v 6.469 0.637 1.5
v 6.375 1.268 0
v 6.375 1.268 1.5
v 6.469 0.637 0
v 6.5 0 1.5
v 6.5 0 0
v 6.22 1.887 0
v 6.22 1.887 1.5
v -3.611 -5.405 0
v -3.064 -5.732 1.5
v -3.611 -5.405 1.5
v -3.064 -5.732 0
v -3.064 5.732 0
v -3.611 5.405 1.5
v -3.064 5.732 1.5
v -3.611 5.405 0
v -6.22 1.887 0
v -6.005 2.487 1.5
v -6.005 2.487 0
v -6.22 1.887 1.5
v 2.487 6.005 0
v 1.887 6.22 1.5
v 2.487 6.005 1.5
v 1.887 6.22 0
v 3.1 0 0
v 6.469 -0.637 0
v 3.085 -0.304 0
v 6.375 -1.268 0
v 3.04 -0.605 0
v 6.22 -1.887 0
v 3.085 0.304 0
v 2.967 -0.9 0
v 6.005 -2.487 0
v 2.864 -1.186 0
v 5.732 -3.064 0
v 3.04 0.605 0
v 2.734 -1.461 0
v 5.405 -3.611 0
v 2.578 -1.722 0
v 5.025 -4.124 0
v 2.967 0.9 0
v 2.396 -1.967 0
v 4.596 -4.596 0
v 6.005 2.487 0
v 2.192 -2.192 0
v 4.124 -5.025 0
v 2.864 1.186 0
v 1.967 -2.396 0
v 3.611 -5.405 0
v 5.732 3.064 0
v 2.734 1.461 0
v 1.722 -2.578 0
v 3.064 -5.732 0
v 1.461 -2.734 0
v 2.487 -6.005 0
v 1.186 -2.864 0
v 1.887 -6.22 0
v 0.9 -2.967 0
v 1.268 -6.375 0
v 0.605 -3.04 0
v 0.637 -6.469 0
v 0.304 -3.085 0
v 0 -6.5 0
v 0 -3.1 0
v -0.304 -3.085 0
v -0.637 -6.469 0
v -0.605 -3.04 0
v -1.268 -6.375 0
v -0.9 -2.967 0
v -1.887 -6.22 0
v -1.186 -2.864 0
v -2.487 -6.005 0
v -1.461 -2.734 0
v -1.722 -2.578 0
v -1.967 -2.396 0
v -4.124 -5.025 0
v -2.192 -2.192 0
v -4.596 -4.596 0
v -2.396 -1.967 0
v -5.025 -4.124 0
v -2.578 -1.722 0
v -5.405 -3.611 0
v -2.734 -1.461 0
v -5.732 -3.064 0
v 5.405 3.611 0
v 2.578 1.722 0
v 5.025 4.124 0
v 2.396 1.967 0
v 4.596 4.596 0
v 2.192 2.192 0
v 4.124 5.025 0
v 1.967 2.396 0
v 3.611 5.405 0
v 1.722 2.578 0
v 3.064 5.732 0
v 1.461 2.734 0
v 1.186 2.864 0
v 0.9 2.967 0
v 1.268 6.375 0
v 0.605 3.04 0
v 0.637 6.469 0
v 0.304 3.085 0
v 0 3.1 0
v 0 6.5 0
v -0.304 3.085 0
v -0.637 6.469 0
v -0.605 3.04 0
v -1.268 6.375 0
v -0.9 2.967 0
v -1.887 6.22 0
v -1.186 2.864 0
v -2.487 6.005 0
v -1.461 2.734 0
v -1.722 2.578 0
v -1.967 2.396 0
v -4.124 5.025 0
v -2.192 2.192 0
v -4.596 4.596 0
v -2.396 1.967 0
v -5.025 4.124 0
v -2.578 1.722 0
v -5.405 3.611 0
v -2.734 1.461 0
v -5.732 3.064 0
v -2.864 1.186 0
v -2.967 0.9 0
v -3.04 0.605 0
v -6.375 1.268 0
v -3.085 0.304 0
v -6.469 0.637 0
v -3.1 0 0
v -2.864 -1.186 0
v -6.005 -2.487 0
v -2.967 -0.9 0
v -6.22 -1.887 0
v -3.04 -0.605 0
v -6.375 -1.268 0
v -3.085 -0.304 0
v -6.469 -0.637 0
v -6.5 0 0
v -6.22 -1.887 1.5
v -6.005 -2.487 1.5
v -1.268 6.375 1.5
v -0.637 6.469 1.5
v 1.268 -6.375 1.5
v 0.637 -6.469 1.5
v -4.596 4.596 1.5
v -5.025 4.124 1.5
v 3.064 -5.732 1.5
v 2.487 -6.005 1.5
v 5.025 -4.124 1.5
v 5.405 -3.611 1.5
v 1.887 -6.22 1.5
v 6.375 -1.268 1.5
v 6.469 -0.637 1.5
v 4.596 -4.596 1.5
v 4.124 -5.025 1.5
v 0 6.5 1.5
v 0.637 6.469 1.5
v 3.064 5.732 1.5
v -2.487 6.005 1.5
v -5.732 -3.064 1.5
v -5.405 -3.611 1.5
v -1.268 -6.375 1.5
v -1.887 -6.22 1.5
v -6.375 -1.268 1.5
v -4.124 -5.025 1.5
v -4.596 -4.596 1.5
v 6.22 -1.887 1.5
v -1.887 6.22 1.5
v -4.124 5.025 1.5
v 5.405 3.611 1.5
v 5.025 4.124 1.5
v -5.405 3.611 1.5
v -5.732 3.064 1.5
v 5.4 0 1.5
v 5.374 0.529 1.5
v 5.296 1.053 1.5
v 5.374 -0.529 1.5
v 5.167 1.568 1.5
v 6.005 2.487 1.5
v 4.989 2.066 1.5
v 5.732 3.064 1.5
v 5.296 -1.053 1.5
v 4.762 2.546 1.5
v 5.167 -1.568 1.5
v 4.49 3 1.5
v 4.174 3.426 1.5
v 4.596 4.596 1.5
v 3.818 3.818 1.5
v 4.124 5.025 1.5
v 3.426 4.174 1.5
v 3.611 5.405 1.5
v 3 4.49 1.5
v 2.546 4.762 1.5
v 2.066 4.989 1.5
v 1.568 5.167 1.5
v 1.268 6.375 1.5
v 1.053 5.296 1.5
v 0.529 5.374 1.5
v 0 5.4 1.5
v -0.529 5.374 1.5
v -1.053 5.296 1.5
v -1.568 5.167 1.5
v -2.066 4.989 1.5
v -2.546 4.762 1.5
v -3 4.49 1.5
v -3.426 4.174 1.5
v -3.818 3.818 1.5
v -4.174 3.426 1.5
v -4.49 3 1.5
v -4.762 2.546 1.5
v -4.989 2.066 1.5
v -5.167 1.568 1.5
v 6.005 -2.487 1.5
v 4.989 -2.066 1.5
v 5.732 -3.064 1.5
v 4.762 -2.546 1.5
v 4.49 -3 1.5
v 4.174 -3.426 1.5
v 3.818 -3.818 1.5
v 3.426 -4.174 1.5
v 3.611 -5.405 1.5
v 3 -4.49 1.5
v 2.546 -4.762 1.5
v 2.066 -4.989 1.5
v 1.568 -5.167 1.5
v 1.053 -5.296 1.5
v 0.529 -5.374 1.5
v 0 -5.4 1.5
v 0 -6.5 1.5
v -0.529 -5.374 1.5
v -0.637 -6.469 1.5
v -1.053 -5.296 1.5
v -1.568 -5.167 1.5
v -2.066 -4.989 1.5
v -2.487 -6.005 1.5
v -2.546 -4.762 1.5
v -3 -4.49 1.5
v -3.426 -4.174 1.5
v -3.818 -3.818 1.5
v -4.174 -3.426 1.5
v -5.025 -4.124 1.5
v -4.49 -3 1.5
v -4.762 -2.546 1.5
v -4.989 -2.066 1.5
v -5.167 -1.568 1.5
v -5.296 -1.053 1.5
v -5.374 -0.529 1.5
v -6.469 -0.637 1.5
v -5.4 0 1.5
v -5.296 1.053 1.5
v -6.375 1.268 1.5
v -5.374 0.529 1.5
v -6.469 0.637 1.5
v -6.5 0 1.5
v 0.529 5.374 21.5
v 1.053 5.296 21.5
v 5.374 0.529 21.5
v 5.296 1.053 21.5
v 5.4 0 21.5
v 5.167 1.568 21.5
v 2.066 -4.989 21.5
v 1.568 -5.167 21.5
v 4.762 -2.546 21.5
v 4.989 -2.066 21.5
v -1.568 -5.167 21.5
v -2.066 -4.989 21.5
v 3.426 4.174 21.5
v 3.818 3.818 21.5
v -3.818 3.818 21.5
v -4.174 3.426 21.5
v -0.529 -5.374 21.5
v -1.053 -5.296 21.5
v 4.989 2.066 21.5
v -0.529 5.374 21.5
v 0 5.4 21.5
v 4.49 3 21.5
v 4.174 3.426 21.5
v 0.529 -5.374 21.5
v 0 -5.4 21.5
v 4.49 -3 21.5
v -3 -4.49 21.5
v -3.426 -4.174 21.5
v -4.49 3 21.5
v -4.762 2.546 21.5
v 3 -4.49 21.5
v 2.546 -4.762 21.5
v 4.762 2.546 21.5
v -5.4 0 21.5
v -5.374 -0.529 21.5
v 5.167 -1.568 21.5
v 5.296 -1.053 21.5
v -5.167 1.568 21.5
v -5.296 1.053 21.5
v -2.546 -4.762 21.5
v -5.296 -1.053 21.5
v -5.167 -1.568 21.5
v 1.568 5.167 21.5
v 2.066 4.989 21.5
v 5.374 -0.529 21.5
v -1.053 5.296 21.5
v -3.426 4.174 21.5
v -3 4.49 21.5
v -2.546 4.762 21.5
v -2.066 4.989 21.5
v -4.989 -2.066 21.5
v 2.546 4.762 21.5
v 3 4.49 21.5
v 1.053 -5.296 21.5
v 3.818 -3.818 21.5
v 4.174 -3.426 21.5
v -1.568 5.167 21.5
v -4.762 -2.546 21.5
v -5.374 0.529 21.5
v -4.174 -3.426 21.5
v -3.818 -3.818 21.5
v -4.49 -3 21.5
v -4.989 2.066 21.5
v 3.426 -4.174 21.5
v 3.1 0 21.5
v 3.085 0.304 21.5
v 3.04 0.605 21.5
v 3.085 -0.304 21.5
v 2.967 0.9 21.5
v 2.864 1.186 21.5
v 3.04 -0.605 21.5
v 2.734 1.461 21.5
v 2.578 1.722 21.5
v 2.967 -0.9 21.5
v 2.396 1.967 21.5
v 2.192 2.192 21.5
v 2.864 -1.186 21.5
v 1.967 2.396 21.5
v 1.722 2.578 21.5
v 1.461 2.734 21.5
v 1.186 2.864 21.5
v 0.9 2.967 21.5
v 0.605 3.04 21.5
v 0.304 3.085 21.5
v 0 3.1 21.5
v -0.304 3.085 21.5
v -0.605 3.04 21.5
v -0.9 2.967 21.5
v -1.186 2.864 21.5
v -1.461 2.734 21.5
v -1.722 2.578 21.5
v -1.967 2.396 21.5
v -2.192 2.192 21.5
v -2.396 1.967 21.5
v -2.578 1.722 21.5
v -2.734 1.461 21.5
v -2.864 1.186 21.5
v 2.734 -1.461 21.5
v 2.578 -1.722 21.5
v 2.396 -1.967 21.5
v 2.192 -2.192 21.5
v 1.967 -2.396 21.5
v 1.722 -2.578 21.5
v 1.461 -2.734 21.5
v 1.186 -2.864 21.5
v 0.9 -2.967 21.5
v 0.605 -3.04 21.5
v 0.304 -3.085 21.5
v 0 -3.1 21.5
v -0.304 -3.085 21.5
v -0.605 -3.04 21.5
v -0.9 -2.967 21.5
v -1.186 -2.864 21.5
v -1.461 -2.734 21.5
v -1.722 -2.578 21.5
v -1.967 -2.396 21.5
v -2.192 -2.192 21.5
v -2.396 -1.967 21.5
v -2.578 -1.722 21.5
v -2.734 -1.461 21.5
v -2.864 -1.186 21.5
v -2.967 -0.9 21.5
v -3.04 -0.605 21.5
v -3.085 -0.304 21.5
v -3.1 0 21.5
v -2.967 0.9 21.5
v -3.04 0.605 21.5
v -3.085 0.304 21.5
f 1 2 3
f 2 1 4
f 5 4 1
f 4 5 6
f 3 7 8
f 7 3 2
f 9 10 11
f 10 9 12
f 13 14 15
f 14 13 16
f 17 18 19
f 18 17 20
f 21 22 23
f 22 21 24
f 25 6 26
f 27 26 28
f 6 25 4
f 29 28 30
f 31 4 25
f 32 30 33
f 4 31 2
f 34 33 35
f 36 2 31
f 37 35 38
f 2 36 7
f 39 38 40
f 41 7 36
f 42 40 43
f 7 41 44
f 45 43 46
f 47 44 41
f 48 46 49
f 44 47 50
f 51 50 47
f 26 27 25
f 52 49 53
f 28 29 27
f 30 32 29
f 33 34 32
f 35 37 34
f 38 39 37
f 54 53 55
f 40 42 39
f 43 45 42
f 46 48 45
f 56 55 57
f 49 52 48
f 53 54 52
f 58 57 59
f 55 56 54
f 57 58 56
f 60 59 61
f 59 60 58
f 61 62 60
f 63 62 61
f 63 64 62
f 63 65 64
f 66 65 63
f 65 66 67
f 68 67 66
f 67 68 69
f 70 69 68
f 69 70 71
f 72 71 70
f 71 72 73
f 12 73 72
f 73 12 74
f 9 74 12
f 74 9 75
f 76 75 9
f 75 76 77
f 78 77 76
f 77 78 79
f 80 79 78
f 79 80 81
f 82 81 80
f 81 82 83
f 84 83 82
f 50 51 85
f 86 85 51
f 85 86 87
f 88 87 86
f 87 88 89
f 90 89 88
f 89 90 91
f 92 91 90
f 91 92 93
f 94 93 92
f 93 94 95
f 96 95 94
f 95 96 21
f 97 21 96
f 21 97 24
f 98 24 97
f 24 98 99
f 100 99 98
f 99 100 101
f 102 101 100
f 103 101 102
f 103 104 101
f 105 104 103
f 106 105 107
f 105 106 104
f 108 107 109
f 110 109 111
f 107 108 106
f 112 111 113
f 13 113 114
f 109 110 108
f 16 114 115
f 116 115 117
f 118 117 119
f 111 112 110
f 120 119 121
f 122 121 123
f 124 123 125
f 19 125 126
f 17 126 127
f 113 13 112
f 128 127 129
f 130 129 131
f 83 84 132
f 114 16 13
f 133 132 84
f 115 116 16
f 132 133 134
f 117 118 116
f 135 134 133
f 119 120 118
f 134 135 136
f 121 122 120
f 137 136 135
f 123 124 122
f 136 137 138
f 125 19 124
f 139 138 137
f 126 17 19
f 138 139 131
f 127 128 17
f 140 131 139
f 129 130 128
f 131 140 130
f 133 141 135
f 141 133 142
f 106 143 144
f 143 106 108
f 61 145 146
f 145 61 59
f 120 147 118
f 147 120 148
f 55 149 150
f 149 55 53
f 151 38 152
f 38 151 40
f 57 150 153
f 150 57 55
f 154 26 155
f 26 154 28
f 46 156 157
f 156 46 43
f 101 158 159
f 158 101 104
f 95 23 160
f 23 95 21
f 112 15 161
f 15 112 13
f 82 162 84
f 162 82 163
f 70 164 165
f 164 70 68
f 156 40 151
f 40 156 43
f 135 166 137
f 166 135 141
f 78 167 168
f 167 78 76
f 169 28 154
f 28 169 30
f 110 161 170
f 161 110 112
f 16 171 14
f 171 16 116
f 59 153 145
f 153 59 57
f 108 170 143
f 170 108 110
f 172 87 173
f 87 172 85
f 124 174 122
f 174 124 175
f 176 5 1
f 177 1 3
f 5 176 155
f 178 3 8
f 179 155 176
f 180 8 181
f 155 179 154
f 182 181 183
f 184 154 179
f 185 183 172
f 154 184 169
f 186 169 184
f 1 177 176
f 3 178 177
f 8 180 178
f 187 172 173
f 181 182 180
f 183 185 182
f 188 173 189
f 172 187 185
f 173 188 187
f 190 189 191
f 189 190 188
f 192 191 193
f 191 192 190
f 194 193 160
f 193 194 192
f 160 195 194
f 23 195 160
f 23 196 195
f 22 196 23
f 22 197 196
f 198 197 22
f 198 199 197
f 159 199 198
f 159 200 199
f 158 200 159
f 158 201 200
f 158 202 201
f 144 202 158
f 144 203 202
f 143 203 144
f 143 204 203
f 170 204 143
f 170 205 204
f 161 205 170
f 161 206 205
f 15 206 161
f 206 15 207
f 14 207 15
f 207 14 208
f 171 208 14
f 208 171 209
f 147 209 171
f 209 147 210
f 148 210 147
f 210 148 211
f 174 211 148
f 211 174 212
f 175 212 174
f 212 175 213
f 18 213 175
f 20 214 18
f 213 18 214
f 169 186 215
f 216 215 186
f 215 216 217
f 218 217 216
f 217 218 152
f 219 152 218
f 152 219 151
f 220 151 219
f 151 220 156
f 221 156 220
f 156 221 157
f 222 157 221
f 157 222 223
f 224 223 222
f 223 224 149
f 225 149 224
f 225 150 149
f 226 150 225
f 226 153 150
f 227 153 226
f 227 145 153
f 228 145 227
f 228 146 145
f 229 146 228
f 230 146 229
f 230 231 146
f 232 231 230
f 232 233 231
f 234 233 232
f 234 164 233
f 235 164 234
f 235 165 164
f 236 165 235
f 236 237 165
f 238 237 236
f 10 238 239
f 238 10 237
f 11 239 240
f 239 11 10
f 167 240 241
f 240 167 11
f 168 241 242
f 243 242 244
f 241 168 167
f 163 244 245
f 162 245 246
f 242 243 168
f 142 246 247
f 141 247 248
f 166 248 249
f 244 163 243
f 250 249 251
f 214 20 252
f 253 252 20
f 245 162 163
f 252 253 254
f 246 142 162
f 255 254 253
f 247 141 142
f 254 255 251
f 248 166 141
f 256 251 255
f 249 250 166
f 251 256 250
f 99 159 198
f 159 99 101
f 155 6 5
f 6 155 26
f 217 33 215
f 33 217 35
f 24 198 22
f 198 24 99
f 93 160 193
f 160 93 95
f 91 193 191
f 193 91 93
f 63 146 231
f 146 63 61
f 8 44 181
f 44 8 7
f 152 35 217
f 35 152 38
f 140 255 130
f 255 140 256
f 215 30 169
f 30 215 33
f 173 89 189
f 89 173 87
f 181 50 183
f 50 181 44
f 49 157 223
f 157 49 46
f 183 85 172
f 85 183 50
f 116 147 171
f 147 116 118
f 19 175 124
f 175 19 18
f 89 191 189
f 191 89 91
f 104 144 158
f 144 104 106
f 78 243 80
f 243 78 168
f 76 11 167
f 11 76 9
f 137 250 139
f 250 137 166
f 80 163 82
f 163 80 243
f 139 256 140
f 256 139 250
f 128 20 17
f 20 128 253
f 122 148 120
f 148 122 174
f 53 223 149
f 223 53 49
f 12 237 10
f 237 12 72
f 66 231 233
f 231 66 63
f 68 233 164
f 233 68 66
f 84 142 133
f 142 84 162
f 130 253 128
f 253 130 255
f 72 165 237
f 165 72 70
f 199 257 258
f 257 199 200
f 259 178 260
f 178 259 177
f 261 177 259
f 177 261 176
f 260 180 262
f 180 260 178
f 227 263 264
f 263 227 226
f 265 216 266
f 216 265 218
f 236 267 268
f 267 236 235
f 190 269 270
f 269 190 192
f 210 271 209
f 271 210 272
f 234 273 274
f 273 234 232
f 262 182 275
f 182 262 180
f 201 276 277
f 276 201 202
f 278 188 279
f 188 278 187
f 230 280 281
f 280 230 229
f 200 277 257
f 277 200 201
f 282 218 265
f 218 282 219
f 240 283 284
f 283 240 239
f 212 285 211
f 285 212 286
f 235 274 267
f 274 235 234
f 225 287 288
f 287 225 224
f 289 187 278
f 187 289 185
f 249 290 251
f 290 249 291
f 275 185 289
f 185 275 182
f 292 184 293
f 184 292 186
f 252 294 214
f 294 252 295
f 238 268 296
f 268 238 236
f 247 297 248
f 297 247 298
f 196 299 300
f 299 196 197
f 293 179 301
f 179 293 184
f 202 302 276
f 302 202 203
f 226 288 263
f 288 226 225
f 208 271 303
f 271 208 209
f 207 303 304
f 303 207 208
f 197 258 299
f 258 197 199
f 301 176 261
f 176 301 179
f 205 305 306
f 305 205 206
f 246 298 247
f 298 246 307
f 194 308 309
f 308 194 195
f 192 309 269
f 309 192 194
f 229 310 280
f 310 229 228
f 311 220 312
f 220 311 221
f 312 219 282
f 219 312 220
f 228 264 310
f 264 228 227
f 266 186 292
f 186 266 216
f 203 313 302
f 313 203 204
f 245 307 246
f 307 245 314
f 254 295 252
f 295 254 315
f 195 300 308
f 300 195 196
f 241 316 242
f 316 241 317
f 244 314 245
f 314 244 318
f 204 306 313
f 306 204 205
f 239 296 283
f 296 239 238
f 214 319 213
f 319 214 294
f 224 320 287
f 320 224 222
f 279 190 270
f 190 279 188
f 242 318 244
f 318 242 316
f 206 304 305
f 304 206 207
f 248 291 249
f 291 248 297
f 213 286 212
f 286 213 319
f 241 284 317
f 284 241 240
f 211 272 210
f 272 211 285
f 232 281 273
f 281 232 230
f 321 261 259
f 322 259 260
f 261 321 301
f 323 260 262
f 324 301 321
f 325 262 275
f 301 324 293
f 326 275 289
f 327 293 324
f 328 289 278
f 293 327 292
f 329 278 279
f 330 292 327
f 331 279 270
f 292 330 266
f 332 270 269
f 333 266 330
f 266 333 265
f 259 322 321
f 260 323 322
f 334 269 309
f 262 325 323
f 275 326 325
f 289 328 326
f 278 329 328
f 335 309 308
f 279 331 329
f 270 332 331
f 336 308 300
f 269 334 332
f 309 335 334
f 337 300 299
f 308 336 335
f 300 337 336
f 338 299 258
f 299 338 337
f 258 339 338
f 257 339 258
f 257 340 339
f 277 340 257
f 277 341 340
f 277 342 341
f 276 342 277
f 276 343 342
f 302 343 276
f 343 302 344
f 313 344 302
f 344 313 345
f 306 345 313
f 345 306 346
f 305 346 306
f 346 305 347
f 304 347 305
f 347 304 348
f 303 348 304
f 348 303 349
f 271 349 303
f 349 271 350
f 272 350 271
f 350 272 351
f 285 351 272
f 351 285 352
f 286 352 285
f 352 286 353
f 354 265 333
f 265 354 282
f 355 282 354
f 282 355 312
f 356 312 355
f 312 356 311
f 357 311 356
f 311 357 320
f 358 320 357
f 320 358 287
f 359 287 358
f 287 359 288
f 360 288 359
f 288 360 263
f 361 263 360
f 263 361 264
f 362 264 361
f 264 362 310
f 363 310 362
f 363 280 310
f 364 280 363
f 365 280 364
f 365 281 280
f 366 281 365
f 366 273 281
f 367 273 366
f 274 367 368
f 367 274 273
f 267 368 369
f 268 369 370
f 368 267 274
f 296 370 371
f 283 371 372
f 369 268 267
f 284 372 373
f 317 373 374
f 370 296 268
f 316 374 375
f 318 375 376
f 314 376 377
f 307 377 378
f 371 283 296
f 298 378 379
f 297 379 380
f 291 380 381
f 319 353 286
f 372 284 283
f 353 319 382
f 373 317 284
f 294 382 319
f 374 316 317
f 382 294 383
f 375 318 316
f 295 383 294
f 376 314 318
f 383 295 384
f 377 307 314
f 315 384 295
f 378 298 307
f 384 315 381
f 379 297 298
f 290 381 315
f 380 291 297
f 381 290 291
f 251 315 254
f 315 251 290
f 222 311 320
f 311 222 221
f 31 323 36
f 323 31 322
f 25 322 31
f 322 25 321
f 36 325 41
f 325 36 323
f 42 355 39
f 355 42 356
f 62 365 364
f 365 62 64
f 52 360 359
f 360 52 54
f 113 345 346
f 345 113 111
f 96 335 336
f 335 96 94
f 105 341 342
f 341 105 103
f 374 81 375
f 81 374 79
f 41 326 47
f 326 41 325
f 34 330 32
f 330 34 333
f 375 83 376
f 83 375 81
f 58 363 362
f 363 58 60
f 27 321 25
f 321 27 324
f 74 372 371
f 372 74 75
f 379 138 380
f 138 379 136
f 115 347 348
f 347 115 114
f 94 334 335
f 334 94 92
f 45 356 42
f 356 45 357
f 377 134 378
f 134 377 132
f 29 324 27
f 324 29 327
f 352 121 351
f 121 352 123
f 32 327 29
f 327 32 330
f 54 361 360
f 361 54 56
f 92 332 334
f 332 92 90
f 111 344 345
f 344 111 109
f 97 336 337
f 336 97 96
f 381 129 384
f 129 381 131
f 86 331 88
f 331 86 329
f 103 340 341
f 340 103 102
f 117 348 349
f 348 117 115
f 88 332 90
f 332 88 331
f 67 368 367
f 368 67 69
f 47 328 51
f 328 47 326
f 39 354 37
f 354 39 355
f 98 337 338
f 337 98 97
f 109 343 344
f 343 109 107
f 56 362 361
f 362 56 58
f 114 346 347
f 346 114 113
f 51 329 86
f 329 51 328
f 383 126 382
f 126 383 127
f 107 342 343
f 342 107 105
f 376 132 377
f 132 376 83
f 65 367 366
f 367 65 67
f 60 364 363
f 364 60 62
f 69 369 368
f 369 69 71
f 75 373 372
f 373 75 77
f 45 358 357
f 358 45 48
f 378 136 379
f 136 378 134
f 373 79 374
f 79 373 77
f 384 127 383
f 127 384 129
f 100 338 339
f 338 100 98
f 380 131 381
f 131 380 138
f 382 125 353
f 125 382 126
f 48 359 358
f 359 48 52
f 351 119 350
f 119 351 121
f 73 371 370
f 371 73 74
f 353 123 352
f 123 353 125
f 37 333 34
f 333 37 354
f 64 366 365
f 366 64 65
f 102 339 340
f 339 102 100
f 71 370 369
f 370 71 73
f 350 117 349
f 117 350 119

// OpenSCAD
// Variables
$fn = 64; // resolution for curved surfaces

// Dimensions (mm)
collar_d = 13;          // diameter of collar
collar_h = 1.5;         // height of collar
sleeve_outer_d = 10.8;  // outer diameter of sleeve body
sleeve_h = 21.5 - collar_h; // height of sleeve body (20 mm)
bore_d = 6.2;           // diameter of bore
bore_h = 21.5 + 0.02;   // bore height extended beyond faces
bore_offset_z = -0.01;  // bore offset to extend below z=0

// Modules
module collar() {
    cylinder(d=collar_d, h=collar_h, $fn=$fn);
}

module sleeve_body() {
    cylinder(d=sleeve_outer_d, h=sleeve_h, $fn=$fn);
}

module bore() {
    translate([0, 0, bore_offset_z]) cylinder(d=bore_d, h=bore_h, $fn=$fn);
}

// Build part: collar + sleeve body, then subtract bore
difference() {
    union() {
        collar();                // collar sits on bed (z=0 to 1.5)
        translate([0, 0, collar_h]) sleeve_body(); // sleeve body starts at z=1.5
    }
    bore(); // straight bore through full height, open at both ends
}
